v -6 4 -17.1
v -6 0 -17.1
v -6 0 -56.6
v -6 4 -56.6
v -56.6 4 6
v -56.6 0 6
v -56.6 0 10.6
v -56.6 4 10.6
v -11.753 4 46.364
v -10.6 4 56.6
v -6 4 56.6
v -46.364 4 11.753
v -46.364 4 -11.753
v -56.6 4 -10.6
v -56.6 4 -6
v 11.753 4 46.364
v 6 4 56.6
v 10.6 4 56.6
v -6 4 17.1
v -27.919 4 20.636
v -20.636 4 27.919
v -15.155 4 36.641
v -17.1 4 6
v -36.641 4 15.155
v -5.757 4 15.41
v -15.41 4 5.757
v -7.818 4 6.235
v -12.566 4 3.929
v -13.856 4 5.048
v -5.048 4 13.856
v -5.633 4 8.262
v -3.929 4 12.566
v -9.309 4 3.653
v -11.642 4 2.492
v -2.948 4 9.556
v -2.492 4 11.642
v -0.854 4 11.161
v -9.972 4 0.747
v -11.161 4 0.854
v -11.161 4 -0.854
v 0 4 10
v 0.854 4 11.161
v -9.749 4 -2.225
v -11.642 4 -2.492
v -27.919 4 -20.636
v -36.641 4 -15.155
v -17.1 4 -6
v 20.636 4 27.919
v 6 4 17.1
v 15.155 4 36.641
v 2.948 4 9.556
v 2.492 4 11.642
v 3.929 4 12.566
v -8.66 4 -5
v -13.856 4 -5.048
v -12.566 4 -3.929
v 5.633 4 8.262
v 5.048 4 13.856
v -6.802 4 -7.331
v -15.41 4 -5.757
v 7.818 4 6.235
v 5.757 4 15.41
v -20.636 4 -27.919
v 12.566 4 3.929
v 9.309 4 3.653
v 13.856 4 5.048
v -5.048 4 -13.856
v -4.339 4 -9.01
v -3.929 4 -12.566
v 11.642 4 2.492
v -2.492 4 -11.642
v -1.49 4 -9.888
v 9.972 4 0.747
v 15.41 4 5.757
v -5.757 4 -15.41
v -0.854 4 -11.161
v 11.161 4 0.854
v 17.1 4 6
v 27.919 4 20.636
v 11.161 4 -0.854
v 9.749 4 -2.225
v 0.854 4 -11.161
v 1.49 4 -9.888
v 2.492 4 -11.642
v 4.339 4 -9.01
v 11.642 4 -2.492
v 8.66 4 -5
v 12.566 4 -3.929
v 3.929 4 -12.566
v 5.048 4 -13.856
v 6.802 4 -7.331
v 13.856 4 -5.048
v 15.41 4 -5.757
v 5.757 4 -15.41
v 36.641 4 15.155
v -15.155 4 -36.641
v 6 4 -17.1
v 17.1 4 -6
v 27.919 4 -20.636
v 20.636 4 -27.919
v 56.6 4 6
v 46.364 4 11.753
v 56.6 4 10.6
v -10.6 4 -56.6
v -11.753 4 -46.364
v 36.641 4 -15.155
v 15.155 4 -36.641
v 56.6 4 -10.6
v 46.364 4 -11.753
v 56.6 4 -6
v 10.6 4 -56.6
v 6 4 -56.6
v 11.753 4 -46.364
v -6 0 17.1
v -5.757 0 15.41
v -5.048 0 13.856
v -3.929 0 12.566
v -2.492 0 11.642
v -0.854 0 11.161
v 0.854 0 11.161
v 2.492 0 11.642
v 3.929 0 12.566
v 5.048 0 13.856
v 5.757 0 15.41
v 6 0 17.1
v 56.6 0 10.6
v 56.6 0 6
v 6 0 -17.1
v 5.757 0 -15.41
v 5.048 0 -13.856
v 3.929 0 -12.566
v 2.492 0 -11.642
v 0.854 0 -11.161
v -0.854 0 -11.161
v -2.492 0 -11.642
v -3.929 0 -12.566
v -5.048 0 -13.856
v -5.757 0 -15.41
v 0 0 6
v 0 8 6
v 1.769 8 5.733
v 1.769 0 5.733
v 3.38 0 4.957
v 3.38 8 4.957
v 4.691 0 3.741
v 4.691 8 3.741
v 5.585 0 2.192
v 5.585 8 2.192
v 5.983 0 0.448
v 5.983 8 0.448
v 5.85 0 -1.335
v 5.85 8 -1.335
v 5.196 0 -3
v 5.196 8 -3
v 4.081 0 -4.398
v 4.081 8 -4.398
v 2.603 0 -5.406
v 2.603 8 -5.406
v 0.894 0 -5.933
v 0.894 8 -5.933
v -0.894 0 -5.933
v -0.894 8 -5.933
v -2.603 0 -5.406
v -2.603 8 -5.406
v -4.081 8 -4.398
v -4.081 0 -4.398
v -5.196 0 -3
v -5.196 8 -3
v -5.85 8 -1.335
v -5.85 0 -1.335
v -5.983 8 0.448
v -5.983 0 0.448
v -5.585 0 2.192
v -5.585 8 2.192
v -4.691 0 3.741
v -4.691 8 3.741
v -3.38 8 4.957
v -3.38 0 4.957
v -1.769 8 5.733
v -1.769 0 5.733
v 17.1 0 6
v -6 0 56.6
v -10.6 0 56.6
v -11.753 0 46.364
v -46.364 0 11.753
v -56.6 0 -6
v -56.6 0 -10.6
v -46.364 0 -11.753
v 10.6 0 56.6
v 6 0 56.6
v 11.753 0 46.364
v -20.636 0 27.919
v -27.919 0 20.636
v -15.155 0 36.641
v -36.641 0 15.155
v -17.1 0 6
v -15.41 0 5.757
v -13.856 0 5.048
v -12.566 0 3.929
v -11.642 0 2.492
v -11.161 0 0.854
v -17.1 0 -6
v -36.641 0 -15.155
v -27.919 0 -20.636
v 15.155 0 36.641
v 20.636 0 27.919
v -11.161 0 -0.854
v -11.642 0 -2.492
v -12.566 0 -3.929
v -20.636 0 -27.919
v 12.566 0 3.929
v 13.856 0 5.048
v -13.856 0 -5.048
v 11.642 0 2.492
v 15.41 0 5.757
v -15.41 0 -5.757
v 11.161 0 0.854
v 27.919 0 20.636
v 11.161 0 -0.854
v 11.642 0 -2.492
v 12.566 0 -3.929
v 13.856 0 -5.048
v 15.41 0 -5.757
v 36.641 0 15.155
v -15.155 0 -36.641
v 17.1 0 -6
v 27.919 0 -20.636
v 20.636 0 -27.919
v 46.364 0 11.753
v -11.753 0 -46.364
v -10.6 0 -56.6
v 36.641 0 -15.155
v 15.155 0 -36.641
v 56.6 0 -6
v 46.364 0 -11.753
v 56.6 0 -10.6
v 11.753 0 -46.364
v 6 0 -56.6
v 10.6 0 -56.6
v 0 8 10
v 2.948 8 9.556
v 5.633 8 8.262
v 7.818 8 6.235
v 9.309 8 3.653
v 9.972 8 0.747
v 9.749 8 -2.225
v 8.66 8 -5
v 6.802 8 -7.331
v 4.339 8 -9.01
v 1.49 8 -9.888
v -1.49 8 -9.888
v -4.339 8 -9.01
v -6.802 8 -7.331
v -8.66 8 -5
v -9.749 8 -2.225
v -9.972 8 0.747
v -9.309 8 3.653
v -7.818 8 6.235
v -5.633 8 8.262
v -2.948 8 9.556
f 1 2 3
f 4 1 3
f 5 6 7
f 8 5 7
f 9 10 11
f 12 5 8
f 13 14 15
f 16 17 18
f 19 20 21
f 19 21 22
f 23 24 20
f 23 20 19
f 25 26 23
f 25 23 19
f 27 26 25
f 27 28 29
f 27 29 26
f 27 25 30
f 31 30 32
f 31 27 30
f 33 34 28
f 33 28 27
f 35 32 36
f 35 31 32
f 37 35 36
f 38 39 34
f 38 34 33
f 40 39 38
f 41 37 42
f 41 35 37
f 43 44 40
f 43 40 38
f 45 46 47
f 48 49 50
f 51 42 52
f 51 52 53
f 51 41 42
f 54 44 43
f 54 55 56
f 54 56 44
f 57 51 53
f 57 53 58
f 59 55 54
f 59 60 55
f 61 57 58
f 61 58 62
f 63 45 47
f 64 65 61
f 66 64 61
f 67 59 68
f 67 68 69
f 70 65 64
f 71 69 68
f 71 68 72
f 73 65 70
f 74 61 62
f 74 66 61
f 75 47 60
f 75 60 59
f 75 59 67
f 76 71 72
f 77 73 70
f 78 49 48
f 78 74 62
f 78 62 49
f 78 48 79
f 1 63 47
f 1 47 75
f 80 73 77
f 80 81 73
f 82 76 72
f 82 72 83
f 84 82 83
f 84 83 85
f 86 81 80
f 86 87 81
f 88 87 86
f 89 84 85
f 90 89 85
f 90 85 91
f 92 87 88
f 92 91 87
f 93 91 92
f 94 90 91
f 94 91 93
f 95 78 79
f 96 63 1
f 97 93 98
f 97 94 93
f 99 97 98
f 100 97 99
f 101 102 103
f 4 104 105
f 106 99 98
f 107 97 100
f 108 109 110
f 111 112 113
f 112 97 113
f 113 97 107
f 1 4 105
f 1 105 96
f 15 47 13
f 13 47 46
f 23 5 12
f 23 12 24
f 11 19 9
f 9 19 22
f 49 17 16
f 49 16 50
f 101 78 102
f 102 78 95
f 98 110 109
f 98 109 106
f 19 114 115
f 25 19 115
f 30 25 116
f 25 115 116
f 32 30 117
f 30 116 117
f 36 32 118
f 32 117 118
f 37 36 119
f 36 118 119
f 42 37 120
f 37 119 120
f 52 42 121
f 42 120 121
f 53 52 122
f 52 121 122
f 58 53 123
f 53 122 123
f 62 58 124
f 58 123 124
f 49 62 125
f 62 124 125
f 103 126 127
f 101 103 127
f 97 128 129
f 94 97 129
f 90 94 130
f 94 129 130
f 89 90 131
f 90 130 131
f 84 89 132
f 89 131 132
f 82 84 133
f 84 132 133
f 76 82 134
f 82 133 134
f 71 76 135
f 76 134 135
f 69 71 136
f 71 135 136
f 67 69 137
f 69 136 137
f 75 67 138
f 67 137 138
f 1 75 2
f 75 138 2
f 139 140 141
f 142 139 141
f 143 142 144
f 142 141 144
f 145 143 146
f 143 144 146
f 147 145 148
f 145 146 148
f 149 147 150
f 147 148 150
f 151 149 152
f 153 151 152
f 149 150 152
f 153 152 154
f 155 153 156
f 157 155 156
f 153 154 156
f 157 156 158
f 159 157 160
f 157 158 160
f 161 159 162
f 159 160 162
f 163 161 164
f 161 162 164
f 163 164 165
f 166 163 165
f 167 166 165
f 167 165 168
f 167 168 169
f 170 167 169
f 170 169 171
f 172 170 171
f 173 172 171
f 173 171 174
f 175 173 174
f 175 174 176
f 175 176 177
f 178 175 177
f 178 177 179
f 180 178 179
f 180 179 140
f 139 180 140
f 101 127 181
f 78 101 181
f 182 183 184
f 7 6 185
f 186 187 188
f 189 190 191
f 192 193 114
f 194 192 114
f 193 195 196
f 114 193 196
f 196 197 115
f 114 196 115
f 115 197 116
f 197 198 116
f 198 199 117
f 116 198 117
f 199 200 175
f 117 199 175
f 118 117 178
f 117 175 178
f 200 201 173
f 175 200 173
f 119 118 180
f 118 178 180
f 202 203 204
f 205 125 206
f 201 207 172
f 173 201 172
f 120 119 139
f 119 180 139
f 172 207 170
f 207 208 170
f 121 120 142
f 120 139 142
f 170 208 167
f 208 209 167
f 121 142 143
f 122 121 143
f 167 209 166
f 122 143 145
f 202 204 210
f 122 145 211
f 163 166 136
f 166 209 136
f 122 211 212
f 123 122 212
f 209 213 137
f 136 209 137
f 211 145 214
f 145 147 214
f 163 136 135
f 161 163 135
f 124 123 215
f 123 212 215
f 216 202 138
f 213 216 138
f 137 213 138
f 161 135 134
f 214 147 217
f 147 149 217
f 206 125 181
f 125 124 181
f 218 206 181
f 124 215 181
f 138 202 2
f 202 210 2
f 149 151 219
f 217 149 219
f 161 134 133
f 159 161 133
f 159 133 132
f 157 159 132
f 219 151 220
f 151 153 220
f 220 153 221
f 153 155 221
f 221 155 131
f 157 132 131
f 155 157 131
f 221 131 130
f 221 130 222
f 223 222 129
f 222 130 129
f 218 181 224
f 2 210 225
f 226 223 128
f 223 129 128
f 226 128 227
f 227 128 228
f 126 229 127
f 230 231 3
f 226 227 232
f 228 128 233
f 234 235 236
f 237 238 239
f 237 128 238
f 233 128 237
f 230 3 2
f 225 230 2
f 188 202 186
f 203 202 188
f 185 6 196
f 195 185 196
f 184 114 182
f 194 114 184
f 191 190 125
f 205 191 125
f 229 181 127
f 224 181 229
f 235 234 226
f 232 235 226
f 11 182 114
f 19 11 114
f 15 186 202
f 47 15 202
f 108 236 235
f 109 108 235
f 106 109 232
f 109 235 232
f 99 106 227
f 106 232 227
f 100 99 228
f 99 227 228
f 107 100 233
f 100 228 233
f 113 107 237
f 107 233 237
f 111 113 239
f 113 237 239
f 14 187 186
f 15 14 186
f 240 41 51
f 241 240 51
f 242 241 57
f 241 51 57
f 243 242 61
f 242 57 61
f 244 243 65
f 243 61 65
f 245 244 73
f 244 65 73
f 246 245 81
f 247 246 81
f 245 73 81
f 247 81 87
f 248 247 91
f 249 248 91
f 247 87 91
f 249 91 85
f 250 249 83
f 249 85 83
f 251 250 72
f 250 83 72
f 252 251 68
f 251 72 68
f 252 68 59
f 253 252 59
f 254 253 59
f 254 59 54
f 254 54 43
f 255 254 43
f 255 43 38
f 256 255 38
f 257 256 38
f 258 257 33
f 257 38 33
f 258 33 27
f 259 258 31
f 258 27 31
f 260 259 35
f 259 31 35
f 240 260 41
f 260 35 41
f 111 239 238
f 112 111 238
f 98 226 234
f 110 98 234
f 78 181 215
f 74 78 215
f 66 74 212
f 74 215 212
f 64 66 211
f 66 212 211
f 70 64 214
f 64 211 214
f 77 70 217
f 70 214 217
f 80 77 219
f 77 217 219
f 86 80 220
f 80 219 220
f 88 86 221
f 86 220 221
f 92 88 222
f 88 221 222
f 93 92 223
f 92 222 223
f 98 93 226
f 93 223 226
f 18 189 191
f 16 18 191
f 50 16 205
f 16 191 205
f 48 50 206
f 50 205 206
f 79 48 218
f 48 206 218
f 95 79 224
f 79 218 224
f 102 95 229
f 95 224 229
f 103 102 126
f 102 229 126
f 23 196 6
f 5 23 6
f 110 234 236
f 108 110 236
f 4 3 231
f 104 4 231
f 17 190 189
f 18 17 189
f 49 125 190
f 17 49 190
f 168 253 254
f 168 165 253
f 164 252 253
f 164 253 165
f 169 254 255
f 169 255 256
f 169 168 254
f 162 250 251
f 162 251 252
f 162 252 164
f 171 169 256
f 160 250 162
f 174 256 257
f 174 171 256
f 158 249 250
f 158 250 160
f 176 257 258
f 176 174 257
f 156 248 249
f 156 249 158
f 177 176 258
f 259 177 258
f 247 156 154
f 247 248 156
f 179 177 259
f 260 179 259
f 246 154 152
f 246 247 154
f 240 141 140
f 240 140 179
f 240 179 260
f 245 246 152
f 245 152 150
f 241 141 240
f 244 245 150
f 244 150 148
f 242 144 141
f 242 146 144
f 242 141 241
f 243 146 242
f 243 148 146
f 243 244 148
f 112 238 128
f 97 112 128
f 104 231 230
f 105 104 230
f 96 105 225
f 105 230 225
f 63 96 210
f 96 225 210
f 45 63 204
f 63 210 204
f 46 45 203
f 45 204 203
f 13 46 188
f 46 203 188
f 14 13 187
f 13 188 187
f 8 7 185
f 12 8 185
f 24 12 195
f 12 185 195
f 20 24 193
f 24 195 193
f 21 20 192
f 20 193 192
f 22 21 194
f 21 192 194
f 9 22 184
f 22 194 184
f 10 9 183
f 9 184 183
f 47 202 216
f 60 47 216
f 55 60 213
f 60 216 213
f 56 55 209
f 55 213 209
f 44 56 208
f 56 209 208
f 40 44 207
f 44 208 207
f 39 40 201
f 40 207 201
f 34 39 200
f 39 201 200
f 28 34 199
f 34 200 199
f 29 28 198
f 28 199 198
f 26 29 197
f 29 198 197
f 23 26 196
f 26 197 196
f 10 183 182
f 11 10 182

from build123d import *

# Parameters (mm, degrees)
BOSS_EXTRUDE1_DEPTH = 4
SKETCH2_R           = 10
BOSS_EXTRUDE2_DEPTH = 4
SKETCH3_R           = 6
CUT_EXTRUDE1_DEPTH  = 81.443271937


with BuildPart() as part:
    # Sketch1 → Boss-Extrude1 (new body)
    with BuildSketch(Plane(origin=(0, 0, 0), x_dir=(1, 0, 0), z_dir=(0, 1, 0))):
        with BuildLine():
            Line((6, 56.6), (6, 17.1))
            ThreePointArc((6, 17.1), (0, 11.1), (-6, 17.1))
            Line((-6, 17.1), (-6, 56.6))
            Line((-6, 56.6), (-10.6, 56.6))
            ThreePointArc((-10.6, 56.6), (-24.073088065, 24.073088065), (-56.6, 10.6))
            Line((-56.6, 10.6), (-56.6, 6))
            Line((-56.6, 6), (-17.1, 6))
            ThreePointArc((-17.1, 6), (-11.1, 0), (-17.1, -6))
            Line((-17.1, -6), (-56.6, -6))
            Line((-56.6, -6), (-56.6, -10.6))
            ThreePointArc((-56.6, -10.6), (-24.073088065, -24.073088065), (-10.6, -56.6))
            Line((-10.6, -56.6), (-6, -56.6))
            Line((-6, -56.6), (-6, -17.1))
            ThreePointArc((-6, -17.1), (0, -11.1), (6, -17.1))
            Line((6, -17.1), (6, -56.6))
            Line((6, -56.6), (10.6, -56.6))
            ThreePointArc((10.6, -56.6), (24.073088065, -24.073088065), (56.6, -10.6))
            Line((56.6, -10.6), (56.6, -6))
            Line((56.6, -6), (17.1, -6))
            ThreePointArc((17.1, -6), (11.1, 0), (17.1, 6))
            Line((17.1, 6), (56.6, 6))
            Line((56.6, 6), (56.6, 10.6))
            ThreePointArc((56.6, 10.6), (24.073088065, 24.073088065), (10.6, 56.6))
            Line((10.6, 56.6), (6, 56.6))
        make_face()
    extrude(amount=BOSS_EXTRUDE1_DEPTH)

    # Sketch2 → Boss-Extrude2 (add)
    with BuildSketch(Plane(origin=(0, 4, 0), x_dir=(1, 0, 0), z_dir=(0, 1, 0))):
        with Locations(Location((0, 0, 0), (0, 0, 270))):
            Circle(SKETCH2_R)
    extrude(amount=BOSS_EXTRUDE2_DEPTH)

    # Sketch3 → Cut-Extrude1 (cut, through all)
    with BuildSketch(Plane(origin=(0, 8, 0), x_dir=(1, 0, 0), z_dir=(0, 1, 0))):
        with Locations(Location((0, 0, 0), (0, 0, 270))):
            Circle(SKETCH3_R)
    extrude(amount=-CUT_EXTRUDE1_DEPTH, mode=Mode.SUBTRACT)


solid = part.part
